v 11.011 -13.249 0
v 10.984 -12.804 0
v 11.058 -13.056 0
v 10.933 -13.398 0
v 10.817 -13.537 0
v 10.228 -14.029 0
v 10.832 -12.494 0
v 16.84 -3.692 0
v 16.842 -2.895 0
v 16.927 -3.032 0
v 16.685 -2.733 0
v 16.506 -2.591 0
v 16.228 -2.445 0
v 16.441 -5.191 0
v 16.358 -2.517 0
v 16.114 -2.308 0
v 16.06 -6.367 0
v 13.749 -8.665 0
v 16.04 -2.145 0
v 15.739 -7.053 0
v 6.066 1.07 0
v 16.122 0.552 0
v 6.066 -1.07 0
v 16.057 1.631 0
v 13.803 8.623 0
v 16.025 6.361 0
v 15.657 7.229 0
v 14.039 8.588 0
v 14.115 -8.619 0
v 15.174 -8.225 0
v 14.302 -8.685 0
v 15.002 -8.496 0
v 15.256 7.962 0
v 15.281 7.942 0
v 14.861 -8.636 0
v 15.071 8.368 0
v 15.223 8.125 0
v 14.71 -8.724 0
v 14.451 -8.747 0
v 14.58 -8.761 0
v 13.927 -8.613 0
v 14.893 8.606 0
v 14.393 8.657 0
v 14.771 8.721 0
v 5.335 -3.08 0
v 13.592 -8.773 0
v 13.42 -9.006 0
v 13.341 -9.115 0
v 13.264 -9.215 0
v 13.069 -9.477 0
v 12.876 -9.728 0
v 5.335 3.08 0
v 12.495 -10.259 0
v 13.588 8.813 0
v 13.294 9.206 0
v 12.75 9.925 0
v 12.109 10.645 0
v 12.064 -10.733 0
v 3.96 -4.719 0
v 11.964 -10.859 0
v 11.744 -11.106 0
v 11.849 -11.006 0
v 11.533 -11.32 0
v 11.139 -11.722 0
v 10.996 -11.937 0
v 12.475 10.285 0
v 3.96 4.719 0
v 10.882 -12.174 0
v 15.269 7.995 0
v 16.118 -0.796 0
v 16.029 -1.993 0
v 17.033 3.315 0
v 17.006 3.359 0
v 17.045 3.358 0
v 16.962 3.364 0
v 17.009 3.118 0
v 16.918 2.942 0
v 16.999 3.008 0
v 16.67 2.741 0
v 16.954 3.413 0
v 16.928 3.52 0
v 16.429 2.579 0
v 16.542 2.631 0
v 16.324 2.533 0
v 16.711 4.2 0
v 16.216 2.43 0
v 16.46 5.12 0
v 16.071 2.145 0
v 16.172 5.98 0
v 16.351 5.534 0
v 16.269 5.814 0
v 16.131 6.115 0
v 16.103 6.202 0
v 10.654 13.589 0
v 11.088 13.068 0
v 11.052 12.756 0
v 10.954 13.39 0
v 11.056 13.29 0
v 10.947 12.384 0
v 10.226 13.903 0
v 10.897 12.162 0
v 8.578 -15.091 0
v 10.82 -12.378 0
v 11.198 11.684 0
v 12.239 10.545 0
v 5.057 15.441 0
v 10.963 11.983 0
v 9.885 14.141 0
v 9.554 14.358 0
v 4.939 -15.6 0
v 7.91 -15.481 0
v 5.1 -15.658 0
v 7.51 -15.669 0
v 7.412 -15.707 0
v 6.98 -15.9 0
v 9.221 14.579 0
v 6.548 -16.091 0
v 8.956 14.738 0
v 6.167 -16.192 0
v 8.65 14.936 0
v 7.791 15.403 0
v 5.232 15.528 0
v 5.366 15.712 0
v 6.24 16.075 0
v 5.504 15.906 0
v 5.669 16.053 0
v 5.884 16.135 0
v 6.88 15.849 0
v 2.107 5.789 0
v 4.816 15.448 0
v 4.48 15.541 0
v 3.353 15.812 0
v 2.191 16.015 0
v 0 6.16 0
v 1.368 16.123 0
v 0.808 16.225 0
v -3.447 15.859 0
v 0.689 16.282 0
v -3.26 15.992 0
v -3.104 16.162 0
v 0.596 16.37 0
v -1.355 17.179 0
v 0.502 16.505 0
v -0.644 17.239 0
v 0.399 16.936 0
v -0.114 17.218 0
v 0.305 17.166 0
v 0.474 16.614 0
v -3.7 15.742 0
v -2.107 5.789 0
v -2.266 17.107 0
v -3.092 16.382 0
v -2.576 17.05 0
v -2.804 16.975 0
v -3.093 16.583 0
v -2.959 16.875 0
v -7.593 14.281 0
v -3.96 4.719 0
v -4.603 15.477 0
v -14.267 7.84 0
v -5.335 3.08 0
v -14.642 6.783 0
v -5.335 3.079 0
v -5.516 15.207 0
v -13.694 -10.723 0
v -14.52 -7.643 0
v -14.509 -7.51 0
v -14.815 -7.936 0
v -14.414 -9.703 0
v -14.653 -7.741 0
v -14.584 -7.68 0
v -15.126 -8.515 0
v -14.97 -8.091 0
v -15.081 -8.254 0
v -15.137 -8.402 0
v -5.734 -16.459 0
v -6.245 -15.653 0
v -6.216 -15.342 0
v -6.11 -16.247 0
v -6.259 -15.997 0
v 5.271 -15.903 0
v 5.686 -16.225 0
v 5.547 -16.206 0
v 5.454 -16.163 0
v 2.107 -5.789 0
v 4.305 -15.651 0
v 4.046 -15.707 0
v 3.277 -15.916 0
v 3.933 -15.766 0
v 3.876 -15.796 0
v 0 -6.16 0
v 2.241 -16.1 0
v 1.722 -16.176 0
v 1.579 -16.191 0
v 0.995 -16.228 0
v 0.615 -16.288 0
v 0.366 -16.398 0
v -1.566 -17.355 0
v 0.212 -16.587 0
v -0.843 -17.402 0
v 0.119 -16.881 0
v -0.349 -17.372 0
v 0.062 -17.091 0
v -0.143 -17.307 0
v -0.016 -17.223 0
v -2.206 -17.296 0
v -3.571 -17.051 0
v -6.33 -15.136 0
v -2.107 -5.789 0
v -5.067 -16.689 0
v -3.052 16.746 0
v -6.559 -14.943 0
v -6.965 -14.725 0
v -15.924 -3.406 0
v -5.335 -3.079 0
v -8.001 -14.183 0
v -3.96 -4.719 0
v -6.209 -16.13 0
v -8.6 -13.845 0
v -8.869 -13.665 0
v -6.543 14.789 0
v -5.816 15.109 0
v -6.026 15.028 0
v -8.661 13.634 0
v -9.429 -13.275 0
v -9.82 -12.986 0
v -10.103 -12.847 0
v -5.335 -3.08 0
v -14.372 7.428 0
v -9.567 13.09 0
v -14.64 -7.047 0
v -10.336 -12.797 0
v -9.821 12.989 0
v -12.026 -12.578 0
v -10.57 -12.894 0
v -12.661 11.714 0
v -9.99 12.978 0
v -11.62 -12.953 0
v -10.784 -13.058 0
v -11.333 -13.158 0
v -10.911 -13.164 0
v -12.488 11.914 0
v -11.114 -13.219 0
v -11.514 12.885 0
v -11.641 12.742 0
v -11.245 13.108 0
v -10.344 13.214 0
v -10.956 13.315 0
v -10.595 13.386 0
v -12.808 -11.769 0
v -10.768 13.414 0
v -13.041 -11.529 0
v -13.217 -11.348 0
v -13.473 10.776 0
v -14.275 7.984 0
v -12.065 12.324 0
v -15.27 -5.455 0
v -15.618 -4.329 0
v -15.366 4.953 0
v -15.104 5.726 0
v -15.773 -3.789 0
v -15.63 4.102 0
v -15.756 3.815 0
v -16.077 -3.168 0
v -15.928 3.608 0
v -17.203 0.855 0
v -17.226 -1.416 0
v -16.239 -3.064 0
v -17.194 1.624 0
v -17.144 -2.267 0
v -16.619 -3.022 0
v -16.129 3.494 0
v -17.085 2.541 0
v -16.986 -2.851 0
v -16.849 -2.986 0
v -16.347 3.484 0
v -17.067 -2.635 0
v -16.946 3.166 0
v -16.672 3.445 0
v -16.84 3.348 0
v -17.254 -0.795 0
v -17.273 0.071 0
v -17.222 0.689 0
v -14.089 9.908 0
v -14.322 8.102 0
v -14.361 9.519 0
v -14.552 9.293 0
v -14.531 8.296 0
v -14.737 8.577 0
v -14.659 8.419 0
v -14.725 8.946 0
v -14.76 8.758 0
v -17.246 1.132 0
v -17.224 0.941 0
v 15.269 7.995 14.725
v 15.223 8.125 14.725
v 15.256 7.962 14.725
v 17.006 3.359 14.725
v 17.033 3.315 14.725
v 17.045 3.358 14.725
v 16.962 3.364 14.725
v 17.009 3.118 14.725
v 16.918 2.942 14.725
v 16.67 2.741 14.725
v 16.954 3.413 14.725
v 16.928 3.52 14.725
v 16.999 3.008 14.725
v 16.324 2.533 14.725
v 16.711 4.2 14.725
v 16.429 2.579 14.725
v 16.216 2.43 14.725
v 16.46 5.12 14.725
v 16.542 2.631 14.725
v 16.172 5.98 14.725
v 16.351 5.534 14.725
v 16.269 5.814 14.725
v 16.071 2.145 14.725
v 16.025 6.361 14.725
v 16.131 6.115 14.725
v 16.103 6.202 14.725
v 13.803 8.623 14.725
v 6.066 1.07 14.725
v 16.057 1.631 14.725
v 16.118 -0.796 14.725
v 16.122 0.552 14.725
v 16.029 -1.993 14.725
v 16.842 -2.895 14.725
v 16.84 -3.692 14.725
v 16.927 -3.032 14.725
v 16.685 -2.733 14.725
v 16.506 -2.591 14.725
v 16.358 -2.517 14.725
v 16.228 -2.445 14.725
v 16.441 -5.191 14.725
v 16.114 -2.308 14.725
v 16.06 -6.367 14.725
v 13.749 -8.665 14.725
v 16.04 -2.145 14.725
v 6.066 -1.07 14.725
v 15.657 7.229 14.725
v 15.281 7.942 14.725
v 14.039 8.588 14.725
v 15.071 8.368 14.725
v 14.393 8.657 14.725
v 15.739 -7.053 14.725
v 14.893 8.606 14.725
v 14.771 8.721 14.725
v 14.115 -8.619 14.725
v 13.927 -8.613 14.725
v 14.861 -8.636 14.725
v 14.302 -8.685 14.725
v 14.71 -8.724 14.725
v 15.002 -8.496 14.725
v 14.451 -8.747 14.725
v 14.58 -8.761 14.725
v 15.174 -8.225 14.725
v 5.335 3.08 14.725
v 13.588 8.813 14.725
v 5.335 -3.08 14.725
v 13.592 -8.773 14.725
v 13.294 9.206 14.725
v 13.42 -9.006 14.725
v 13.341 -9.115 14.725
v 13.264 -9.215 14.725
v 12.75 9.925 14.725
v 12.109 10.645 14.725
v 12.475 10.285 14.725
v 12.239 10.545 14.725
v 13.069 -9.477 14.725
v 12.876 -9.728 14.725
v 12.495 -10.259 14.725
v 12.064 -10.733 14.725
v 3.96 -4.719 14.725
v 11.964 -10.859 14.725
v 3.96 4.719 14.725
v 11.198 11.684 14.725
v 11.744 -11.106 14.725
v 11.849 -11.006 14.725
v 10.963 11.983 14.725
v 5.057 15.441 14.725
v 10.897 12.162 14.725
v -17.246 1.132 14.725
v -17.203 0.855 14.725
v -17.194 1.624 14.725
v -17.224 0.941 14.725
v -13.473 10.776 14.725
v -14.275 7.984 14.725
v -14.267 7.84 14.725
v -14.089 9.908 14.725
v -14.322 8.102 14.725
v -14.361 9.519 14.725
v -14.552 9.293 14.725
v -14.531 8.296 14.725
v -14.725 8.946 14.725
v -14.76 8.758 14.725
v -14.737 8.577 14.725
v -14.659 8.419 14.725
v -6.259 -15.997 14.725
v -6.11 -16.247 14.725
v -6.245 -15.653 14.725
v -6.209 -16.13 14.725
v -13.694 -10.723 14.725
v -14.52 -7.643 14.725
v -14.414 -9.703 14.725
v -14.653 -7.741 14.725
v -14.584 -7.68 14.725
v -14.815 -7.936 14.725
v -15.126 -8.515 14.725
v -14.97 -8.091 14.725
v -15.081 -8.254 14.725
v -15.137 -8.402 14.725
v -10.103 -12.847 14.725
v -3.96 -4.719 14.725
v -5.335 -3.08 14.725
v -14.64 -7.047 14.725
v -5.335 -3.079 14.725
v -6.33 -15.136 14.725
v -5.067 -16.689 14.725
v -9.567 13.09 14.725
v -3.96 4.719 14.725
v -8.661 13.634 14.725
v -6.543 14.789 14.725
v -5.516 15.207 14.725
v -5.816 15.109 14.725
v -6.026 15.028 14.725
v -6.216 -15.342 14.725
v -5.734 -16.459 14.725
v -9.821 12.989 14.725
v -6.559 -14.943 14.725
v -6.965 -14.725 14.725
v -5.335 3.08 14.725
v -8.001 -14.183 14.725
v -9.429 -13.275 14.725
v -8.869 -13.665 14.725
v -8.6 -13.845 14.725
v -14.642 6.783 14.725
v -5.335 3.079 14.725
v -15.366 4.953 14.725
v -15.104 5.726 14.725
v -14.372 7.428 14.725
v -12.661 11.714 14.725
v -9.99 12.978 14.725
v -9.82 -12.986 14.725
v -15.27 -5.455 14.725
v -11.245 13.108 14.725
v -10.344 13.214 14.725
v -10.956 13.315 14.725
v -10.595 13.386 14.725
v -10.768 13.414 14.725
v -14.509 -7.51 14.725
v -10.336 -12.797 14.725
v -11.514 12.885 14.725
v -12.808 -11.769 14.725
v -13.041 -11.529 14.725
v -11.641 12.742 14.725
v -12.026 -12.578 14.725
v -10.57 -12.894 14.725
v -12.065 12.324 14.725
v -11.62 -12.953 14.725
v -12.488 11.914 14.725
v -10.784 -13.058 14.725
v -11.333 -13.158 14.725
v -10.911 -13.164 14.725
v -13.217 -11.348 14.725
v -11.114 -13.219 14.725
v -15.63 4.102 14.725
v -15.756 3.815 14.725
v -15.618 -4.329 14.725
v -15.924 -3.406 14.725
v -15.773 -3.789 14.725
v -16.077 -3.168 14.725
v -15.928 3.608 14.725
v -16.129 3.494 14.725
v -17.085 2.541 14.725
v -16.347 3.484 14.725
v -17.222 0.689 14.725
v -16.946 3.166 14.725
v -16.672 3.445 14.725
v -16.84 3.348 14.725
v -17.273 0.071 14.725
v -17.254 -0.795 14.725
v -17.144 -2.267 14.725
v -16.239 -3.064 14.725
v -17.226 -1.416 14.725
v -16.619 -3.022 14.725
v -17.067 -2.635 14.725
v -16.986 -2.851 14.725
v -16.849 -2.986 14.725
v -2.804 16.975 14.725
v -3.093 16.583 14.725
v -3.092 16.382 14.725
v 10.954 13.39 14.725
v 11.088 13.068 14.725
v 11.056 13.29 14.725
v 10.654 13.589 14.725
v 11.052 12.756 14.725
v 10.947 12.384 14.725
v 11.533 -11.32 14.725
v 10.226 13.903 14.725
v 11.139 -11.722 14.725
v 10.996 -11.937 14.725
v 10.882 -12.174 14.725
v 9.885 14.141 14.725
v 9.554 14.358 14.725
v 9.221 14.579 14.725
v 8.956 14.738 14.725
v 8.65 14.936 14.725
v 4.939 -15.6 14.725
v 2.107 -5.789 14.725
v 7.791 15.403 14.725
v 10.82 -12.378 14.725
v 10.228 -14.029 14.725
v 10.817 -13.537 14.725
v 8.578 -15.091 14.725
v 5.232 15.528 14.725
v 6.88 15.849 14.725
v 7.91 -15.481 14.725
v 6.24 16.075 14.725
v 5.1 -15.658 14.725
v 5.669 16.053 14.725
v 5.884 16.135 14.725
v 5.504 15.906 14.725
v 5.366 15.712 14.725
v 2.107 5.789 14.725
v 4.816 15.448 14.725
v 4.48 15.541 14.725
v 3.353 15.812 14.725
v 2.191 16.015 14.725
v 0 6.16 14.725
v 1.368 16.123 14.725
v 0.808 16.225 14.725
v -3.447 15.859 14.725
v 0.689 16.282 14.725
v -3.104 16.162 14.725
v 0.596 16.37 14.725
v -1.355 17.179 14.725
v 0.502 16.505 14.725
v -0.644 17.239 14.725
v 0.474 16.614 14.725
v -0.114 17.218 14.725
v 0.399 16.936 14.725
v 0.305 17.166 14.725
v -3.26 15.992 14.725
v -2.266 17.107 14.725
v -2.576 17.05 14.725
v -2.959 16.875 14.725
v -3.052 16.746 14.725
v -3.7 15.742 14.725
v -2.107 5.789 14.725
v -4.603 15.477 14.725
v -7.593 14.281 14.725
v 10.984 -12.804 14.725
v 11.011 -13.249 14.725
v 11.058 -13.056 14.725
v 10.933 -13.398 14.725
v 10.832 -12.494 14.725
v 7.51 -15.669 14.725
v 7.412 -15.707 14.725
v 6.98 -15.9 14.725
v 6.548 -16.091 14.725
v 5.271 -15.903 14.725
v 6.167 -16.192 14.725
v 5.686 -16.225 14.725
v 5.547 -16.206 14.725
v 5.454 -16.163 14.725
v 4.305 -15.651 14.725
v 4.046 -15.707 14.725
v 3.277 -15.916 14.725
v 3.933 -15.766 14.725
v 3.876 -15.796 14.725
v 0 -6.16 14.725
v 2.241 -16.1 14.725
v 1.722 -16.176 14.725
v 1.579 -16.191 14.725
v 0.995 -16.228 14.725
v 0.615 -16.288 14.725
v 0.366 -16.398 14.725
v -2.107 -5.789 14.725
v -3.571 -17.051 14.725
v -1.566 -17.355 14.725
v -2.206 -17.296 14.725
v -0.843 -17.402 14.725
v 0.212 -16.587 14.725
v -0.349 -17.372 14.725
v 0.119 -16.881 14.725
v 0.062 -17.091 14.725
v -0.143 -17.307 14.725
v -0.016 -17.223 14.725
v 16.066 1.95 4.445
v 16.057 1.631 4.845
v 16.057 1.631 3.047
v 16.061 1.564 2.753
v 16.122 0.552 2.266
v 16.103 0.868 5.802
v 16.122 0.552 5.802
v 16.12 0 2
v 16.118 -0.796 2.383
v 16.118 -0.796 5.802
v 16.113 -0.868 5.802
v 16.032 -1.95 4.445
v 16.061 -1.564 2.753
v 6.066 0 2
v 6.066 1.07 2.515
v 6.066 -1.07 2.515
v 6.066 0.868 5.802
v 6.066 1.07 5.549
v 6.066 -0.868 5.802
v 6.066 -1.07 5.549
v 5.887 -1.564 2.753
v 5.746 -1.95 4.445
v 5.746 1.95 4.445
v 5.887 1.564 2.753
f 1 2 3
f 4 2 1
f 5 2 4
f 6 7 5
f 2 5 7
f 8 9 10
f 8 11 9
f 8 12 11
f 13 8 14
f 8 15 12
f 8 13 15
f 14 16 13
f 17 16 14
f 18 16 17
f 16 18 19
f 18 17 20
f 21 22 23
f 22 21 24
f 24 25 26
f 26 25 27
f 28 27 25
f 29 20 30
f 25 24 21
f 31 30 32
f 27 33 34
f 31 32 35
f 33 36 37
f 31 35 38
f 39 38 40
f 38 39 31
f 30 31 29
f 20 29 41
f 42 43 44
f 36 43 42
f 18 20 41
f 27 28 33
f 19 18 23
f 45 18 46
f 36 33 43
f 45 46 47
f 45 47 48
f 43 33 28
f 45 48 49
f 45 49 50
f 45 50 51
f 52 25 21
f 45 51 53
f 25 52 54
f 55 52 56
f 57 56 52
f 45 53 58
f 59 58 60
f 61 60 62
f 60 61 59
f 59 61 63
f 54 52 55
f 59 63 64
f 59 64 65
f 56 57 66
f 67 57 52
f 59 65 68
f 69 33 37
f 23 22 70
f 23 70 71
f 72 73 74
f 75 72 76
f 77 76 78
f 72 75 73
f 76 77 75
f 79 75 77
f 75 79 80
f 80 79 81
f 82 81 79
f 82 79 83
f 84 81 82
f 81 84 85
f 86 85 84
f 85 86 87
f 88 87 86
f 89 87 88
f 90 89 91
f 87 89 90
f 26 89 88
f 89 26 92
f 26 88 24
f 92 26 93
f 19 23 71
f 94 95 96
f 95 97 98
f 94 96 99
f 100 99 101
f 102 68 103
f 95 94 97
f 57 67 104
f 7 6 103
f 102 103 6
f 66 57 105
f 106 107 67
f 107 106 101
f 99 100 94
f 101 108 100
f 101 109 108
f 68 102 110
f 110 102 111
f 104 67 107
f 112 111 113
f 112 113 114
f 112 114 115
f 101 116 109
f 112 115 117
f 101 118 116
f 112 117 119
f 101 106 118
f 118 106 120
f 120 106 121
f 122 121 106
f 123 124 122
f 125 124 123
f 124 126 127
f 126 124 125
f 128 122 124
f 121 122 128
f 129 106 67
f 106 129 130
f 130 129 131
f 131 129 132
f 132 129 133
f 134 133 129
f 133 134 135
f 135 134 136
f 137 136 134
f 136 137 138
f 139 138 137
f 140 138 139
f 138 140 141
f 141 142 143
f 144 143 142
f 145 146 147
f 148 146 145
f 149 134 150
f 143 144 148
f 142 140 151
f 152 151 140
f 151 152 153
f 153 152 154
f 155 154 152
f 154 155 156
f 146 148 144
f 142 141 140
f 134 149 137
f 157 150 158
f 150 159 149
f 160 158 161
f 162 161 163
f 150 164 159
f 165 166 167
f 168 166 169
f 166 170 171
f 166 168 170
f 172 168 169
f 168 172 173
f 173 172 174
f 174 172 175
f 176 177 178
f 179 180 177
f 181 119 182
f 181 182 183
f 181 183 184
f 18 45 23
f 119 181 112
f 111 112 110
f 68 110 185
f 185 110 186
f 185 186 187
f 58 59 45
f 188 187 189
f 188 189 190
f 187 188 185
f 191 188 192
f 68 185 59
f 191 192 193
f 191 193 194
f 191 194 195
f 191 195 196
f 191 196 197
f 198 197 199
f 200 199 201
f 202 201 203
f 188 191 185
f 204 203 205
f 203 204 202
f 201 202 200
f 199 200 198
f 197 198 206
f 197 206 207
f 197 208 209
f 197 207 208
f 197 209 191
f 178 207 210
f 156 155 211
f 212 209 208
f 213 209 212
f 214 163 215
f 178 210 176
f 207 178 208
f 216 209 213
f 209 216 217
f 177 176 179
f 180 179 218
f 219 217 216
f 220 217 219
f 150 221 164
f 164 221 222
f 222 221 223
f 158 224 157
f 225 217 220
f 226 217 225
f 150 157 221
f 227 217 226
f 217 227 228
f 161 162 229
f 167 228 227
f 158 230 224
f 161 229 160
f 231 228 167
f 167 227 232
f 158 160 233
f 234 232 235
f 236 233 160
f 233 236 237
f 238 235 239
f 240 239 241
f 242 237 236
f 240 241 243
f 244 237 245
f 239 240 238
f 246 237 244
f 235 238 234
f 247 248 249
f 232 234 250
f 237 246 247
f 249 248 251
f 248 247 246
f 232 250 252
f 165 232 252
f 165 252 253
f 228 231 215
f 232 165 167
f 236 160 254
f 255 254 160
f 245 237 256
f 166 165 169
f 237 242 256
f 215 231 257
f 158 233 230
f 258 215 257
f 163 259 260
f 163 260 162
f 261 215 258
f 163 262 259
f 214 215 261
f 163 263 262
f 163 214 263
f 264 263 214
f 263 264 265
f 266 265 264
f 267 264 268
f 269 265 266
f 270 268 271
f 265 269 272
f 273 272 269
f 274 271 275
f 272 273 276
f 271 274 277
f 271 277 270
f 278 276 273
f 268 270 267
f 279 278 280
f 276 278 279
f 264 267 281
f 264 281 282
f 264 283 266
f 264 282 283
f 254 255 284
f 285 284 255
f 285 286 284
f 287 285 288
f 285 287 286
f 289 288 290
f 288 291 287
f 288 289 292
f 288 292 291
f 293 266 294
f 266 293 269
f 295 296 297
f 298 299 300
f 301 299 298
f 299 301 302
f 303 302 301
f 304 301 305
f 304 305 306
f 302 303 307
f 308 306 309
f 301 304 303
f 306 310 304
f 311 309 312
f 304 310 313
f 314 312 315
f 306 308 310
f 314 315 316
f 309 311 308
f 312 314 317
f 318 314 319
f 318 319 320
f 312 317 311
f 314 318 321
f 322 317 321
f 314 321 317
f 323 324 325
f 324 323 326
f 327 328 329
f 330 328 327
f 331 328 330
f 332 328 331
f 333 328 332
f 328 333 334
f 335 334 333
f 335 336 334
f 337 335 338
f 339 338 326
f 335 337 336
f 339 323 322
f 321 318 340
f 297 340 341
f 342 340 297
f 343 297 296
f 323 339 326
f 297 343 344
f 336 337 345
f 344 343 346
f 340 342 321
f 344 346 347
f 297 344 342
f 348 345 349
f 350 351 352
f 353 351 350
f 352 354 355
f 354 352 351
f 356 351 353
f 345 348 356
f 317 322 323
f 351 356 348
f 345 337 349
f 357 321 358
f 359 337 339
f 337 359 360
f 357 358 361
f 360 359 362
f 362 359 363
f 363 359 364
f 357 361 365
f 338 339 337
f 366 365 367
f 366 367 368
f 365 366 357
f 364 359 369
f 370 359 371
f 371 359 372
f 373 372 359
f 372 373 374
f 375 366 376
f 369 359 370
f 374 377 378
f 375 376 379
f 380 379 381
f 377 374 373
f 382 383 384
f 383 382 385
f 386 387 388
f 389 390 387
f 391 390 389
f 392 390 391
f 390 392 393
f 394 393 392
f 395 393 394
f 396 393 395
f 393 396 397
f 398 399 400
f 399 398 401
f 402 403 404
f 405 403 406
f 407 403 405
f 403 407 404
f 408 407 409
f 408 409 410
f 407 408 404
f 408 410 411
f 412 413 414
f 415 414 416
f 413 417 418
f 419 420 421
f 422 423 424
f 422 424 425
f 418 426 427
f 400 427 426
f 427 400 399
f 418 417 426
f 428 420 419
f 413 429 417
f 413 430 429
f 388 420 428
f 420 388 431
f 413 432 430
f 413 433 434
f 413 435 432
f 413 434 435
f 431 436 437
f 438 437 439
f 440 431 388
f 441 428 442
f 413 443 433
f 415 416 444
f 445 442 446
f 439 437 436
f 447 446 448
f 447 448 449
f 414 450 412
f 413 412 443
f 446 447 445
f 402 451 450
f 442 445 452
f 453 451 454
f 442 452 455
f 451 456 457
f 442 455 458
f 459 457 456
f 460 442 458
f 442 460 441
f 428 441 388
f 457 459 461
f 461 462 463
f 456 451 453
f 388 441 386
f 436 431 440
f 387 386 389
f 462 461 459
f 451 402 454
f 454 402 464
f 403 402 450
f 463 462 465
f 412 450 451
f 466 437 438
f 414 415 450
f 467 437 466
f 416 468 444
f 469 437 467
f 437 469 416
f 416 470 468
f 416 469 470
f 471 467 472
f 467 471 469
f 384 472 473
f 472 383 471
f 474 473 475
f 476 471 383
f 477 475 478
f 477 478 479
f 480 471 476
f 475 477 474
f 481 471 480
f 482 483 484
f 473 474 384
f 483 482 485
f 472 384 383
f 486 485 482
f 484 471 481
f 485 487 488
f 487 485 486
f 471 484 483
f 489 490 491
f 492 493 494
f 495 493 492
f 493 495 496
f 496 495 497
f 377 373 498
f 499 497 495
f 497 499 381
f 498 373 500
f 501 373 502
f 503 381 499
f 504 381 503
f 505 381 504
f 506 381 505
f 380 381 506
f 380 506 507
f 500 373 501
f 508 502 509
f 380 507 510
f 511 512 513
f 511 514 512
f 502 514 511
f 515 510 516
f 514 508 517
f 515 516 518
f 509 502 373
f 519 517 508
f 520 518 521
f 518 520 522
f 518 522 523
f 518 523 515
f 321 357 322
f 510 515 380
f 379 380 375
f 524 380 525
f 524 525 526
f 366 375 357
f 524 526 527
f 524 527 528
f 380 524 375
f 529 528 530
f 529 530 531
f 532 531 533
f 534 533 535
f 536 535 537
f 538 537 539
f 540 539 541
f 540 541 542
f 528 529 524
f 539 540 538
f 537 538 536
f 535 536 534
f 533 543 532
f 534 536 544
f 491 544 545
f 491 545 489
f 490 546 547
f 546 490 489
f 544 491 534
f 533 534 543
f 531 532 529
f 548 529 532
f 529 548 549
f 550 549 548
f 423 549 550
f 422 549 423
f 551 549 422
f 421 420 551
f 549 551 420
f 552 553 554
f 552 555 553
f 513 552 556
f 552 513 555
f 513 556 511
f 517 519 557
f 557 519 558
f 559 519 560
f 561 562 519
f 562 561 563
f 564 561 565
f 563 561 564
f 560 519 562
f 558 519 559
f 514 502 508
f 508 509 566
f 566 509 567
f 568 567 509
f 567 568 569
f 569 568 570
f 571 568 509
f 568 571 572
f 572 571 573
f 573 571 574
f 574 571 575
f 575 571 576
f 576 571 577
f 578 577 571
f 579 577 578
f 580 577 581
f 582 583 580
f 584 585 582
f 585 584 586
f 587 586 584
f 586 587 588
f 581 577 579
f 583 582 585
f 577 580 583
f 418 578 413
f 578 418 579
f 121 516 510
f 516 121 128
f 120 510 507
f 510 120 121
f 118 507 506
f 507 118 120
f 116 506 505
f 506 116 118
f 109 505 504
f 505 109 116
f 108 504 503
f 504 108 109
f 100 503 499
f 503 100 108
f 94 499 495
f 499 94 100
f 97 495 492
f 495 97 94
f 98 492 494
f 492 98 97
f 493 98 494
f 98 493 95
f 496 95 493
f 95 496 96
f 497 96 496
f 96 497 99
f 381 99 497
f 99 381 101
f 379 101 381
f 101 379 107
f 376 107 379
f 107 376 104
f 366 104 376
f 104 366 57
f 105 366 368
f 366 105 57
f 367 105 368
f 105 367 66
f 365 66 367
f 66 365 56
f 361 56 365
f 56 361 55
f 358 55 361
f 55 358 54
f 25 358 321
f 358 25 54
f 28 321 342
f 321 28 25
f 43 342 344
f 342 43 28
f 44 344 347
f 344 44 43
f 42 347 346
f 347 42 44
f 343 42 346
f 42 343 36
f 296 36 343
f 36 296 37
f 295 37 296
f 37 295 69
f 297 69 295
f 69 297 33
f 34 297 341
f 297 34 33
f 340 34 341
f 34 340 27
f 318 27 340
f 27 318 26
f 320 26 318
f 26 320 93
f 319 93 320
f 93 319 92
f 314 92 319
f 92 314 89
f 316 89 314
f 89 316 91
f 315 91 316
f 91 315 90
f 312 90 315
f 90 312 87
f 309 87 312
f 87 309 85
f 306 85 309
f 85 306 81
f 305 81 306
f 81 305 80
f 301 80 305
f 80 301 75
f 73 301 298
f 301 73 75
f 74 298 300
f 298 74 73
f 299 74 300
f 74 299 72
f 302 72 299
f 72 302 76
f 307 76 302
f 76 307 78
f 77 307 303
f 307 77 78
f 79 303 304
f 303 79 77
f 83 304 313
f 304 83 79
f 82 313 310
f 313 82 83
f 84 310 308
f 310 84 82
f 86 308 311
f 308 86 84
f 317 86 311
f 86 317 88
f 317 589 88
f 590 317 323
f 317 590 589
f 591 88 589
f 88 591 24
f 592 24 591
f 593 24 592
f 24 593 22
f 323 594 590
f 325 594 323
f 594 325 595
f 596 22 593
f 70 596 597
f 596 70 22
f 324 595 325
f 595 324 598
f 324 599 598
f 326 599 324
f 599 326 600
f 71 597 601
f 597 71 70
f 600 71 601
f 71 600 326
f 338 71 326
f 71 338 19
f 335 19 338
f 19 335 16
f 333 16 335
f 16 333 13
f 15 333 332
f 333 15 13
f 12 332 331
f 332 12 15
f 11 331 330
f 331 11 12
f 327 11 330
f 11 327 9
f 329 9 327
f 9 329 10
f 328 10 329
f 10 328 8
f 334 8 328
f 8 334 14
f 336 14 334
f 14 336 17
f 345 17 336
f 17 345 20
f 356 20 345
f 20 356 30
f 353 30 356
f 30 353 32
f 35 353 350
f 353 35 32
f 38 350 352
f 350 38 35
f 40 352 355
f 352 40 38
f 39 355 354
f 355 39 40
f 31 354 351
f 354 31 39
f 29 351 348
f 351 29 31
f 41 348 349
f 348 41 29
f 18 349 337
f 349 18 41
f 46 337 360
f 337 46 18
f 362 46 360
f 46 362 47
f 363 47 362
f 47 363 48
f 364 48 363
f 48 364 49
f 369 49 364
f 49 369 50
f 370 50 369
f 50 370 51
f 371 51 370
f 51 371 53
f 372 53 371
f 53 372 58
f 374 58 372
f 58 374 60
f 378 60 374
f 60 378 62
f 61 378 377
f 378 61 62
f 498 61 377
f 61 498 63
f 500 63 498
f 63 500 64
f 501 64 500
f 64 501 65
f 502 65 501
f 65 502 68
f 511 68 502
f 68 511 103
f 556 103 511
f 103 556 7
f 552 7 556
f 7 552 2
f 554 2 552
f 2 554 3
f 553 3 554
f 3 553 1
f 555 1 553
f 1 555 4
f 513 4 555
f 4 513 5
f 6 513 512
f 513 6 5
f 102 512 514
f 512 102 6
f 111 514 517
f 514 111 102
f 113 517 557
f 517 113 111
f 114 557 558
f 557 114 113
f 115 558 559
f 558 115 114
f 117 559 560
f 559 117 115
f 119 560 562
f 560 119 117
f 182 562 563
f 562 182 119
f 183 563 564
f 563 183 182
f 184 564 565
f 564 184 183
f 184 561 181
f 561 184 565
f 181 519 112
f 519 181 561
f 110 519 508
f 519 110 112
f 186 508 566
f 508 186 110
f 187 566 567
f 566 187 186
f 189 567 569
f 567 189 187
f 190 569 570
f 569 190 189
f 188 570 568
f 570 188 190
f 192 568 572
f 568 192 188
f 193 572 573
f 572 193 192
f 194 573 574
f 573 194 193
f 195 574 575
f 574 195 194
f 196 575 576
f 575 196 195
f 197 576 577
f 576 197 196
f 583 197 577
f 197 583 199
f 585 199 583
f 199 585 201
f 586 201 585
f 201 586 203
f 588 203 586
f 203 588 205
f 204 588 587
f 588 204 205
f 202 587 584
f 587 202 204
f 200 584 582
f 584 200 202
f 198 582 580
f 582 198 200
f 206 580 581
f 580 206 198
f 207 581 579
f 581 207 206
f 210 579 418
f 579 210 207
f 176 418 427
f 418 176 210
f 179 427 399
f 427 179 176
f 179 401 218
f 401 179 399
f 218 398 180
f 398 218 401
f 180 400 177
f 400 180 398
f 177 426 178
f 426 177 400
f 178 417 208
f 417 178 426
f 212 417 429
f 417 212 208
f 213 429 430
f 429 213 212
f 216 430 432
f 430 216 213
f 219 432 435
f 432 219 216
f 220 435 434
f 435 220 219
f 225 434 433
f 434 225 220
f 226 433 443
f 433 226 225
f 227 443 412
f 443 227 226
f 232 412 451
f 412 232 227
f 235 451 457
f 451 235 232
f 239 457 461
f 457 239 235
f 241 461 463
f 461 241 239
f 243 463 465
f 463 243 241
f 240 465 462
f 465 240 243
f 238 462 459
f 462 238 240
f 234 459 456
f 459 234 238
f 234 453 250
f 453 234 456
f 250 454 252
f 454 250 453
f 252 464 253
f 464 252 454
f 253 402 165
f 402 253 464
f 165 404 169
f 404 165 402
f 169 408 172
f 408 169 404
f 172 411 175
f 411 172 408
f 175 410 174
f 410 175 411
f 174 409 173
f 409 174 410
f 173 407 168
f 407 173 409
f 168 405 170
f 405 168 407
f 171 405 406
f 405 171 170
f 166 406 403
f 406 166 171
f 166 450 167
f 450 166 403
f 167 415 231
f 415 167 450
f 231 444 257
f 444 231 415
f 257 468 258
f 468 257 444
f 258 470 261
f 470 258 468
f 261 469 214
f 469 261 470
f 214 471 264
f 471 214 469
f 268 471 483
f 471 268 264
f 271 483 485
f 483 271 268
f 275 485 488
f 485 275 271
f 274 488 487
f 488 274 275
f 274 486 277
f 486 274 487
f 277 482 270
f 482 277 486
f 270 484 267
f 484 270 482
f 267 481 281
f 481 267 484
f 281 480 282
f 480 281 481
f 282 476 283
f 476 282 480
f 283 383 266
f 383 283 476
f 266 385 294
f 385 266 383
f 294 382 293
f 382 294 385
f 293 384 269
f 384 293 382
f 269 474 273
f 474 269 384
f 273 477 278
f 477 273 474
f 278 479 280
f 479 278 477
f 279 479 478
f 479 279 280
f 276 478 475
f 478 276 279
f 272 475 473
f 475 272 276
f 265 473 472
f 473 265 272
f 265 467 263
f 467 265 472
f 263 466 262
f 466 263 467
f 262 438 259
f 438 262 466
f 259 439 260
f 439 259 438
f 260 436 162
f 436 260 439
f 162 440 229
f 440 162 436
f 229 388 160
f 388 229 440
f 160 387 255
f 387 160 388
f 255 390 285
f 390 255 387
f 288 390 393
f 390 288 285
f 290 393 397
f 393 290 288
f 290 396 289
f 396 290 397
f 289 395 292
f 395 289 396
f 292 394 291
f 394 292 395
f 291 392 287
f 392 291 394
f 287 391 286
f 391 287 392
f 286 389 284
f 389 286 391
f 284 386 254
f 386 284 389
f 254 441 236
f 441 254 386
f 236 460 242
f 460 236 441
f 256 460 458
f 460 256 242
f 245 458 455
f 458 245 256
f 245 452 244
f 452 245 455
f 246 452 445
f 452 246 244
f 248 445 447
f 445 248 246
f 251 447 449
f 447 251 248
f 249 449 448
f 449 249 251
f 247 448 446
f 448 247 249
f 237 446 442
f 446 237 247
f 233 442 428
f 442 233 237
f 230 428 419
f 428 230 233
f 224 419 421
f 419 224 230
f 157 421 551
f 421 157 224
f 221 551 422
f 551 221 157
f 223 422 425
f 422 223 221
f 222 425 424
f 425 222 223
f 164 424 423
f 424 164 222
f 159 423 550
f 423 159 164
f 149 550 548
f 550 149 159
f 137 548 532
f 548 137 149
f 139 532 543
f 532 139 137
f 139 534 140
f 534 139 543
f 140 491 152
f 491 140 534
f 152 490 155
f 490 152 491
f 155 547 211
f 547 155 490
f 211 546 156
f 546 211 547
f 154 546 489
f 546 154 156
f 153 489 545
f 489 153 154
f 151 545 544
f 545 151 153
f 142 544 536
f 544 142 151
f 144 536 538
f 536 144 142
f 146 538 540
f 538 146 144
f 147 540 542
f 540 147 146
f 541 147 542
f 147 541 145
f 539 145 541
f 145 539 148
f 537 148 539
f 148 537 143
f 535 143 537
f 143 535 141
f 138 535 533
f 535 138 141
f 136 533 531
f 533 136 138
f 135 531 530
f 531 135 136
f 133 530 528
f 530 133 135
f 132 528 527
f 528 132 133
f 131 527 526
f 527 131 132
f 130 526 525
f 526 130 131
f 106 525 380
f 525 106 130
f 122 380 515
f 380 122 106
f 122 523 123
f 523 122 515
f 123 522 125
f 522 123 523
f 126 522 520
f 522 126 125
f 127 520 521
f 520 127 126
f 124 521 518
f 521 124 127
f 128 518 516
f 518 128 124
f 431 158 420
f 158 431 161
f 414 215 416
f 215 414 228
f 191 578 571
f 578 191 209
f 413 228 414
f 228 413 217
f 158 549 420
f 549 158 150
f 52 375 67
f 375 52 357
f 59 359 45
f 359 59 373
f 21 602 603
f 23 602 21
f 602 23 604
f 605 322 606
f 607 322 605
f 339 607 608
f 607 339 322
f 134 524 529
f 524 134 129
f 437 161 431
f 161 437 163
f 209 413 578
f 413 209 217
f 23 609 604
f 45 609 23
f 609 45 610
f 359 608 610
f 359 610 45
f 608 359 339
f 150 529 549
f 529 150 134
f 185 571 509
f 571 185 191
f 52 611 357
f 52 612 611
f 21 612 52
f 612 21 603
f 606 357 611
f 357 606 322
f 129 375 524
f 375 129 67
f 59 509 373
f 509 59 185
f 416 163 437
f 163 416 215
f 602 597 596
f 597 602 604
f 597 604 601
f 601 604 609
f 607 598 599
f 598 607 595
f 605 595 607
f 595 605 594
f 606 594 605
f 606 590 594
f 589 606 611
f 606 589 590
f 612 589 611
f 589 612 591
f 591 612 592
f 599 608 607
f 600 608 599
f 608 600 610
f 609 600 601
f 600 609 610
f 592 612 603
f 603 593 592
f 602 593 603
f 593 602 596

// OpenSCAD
// Module names are of the form poly_<inkscape-path-id>().  As a result,
// you can associate a polygon in this OpenSCAD program with the corresponding
// SVG element in the Inkscape document by looking for the XML element with
// the attribute id="inkscape-path-id".

// fudge value is used to ensure that subtracted solids are a tad taller
// in the z dimension than the polygon being subtracted from.  This helps
// keep the resulting .stl file manifold.
fudge = 0.1;

module poly_path3386(h)
{
  scale([25.4/90, -25.4/90, 1]) union()
  {
    difference()
    {
       linear_extrude(height=h)
         polygon([[-33.987888,392.697738],[-49.999310,390.711858],[-59.408529,387.759464],[-62.169828,385.621300],[-63.919597,382.882078],[-65.236568,375.121218],[-66.075386,368.025598],[-69.612998,363.966368],[-75.641290,360.729031],[-85.746118,357.799868],[-111.487888,350.589118],[-126.487888,345.885178],[-133.362888,343.136938],[-147.737888,337.085178],[-157.863998,332.485828],[-164.846488,330.701288],[-170.294780,330.708022],[-175.074868,333.991018],[-179.072268,338.673768],[-181.414938,341.632408],[-185.685749,343.830842],[-190.868628,343.507162],[-198.252756,340.299062],[-209.127318,333.844238],[-230.448268,319.469238],[-236.816338,315.216468],[-241.605968,311.992958],[-255.237888,300.282038],[-276.197684,280.902674],[-297.748008,257.716468],[-298.530303,255.253976],[-297.985943,251.665674],[-296.274140,247.498817],[-293.554108,243.300658],[-290.862888,238.172888],[-289.612888,236.466468],[-288.346295,235.346986],[-288.737353,232.323879],[-293.874928,222.578828],[-315.508307,189.979131],[-328.660668,166.464348],[-334.679480,155.121539],[-339.878817,147.272869],[-344.441620,142.685292],[-348.550827,141.125758],[-357.238139,141.989078],[-362.568678,142.272016],[-366.253002,139.918628],[-369.103974,135.468962],[-372.568990,127.608501],[-378.458152,108.966468],[-382.039590,95.216468],[-386.570862,75.937019],[-388.362674,61.883128],[-388.726847,58.082357],[-389.602112,56.258128],[-391.015580,52.091468],[-392.189853,40.841468],[-394.100952,19.812536],[-393.980025,5.169928],[-392.459216,0.609433],[-389.174474,-2.373812],[-382.078520,-4.778852],[-377.267507,-6.033233],[-373.305582,-9.551489],[-370.455026,-14.988789],[-368.978122,-22.000302],[-367.142514,-42.283532],[-364.946418,-60.813713],[-359.644638,-86.658532],[-356.658329,-102.349650],[-356.277549,-112.058453],[-357.144447,-115.253946],[-358.758987,-117.655211],[-364.359335,-121.010192],[-367.800635,-123.147476],[-370.286114,-126.319423],[-371.661458,-130.242452],[-371.772355,-134.632982],[-369.555734,-143.205617],[-366.366540,-149.158532],[-362.128939,-159.158532],[-352.481307,-181.485303],[-338.773760,-206.321192],[-335.862888,-211.619542],[-328.362888,-222.808232],[-320.862888,-234.171412],[-318.701653,-237.972675],[-313.739350,-244.218646],[-308.258081,-250.230726],[-304.539948,-253.330322],[-300.524921,-253.523447],[-294.107398,-250.884992],[-285.055768,-247.283532],[-281.342092,-248.322538],[-276.132718,-251.803957],[-258.457168,-268.280432],[-237.668561,-287.813311],[-216.589368,-304.158532],[-206.175438,-311.969502],[-201.863048,-314.782006],[-195.613048,-318.384906],[-176.487888,-328.778513],[-157.554116,-338.984662],[-152.454413,-342.806714],[-148.903618,-346.657918],[-146.227438,-351.212924],[-147.007528,-356.174767],[-147.980833,-360.671210],[-147.839054,-364.505963],[-146.374777,-367.833411],[-143.380588,-370.807942],[-138.649072,-373.583940],[-131.972817,-376.315793],[-111.956428,-382.264607],[-96.331428,-386.989347],[-84.376198,-389.037092],[-74.764528,-389.874043],[-71.563698,-385.163620],[-68.362888,-378.328482],[-67.222176,-376.015643],[-64.479608,-373.438631],[-61.985849,-371.922180],[-59.053443,-371.206801],[-46.042108,-371.596801],[-27.112888,-373.080517],[-0.174899,-374.079236],[26.316772,-373.378646],[34.262300,-372.876069],[39.695595,-373.884667],[43.189146,-376.646225],[45.315442,-381.402528],[47.481279,-386.406379],[50.460362,-390.478716],[54.883834,-393.323097],[63.140352,-393.666307],[78.512112,-391.668918],[101.012112,-386.023358],[122.438302,-379.673143],[130.204252,-376.693748],[136.903062,-374.385826],[145.387112,-371.033532],[153.824612,-367.761976],[162.574612,-364.062149],[173.637002,-359.062149],[181.305742,-356.033532],[184.043617,-354.282157],[185.819957,-349.486589],[186.493708,-342.334663],[185.923812,-333.514213],[185.856340,-328.301367],[188.189602,-324.624654],[194.854652,-319.062196],[220.163902,-300.145732],[223.550902,-298.533532],[230.072402,-293.846032],[237.935402,-287.099502],[253.512112,-273.610492],[261.945906,-266.212899],[267.661434,-262.993267],[273.095571,-263.319133],[280.685192,-266.558032],[288.844482,-269.783532],[292.121154,-267.792961],[297.220829,-263.319239],[301.780198,-258.609354],[303.435952,-255.910292],[303.295944,-255.114517],[303.937232,-254.783532],[315.745882,-240.621644],[328.084902,-222.973622],[330.587762,-219.783532],[331.637112,-217.970642],[333.199612,-215.158142],[336.146670,-211.890367],[339.305722,-206.033532],[343.711952,-197.283532],[353.700972,-177.908532],[361.785692,-163.741872],[362.887112,-161.480592],[363.290995,-160.413157],[364.299272,-160.508762],[365.163542,-160.673747],[365.103752,-159.645032],[365.520872,-155.134892],[365.820871,-152.622646],[364.319842,-150.759892],[359.720102,-145.094432],[357.384580,-142.015011],[355.102952,-140.318342],[352.964857,-138.790648],[351.048642,-135.973866],[349.151872,-128.908112],[351.299975,-117.356137],[357.863222,-93.533532],[364.197575,-63.379653],[367.887112,-36.197342],[368.854739,-32.841599],[371.287934,-29.544194],[374.482170,-27.032411],[377.732922,-26.033532],[381.391420,-25.082045],[386.064132,-22.762623],[390.366923,-19.877823],[392.915652,-17.230202],[394.100952,-2.053212],[392.307452,33.356571],[389.362822,61.466468],[385.449962,78.341468],[378.388502,107.226396],[375.838083,114.104678],[373.343672,117.892278],[370.376340,120.591025],[367.645231,122.023864],[364.698150,122.329223],[361.082902,121.645528],[356.582250,121.076053],[352.351451,121.830888],[348.623518,123.829426],[345.631462,126.991058],[342.887112,133.032538],[341.637112,135.841468],[340.387112,138.440078],[337.262112,145.216468],[334.137112,151.744528],[328.143839,165.435862],[320.781192,178.091078],[319.137112,181.375528],[317.262112,185.216468],[315.387112,187.942818],[311.684162,193.727268],[304.789602,204.591468],[302.602607,210.094453],[301.189431,215.933839],[300.776791,220.782478],[301.591402,223.313218],[306.461342,229.524908],[309.310295,234.804256],[309.192742,239.344808],[308.145957,243.047161],[306.214850,246.708069],[295.387112,260.520288],[263.520422,292.091468],[250.458152,303.987729],[242.398202,310.091388],[240.387112,311.407318],[231.637112,317.782388],[222.887112,324.118938],[214.865227,328.168506],[204.255962,331.207718],[201.056942,331.432934],[198.779370,330.922332],[193.453362,325.984268],[188.468610,321.307977],[184.584512,320.779658],[170.650860,324.930919],[165.120474,327.416670],[162.887112,329.261348],[161.738622,330.216468],[148.926122,335.732308],[126.637112,344.774008],[115.387112,348.945668],[112.262112,349.962968],[99.385522,353.567898],[91.160241,356.705014],[86.116402,360.368411],[83.582521,365.321631],[82.887112,372.328218],[82.624029,377.293749],[81.508472,380.619268],[79.050986,383.100175],[74.762112,385.531868],[63.867735,388.561793],[47.461562,390.937928],[32.887112,392.663488],[1.199152,393.666307],[-33.987888,392.697788]]);
       translate([0, 0, -fudge])
         linear_extrude(height=h+2*fudge)
           polygon([[26.252372,105.125118],[34.690422,103.966468],[39.035151,103.455062],[41.637112,102.091468],[44.882602,100.216468],[56.487952,95.216468],[67.166562,90.216468],[73.318872,84.591468],[77.739067,80.618812],[80.797832,78.966468],[82.273385,78.428606],[82.887112,77.135448],[83.571600,75.475957],[85.217272,74.057358],[93.281489,66.966307],[99.137112,60.010518],[101.620332,58.966468],[103.913926,57.923144],[105.848382,54.903968],[110.552662,47.740608],[113.199612,43.678108],[115.387112,40.216468],[117.887112,35.816628],[121.028092,26.186788],[123.590945,17.601082],[124.895312,7.152608],[126.260462,-5.185372],[127.153307,-13.654833],[125.809472,-23.373682],[124.137112,-31.860982],[121.814202,-40.770832],[117.276502,-52.569262],[115.392917,-57.429122],[113.974422,-59.057982],[113.160612,-59.155836],[112.730862,-60.334762],[110.315122,-68.138792],[108.515207,-71.113213],[106.524462,-72.675182],[104.366632,-74.489284],[102.165002,-78.069922],[95.235152,-87.908532],[84.957959,-99.184096],[81.637112,-103.757322],[75.765345,-107.349189],[64.449612,-112.390792],[61.637112,-114.826372],[61.261959,-115.551272],[60.359982,-115.391772],[57.649685,-115.947016],[52.926822,-118.390332],[43.651959,-122.414063],[31.373902,-125.422209],[17.831128,-127.099320],[4.762112,-127.129942],[-20.711670,-123.990051],[-29.596237,-121.629860],[-36.698118,-118.580862],[-44.833098,-116.033532],[-48.999588,-114.764592],[-53.955438,-111.752642],[-58.197253,-109.215908],[-62.755159,-105.336239],[-66.757669,-100.954667],[-69.333298,-96.912222],[-70.862888,-89.974722],[-72.136328,-85.260092],[-75.854488,-75.947592],[-81.456048,-58.682412],[-84.612888,-45.494912],[-86.145818,-40.000612],[-87.951618,-33.188112],[-89.106696,-24.313042],[-91.043118,-19.713512],[-92.379448,-15.651012],[-93.596288,-12.283532],[-93.797048,-10.361972],[-93.829575,-8.375973],[-94.943168,-6.299472],[-97.455118,0.216468],[-98.952438,7.716468],[-101.878959,20.100288],[-102.687098,30.113118],[-102.334379,36.258386],[-101.175388,38.654778],[-99.612888,40.751908],[-97.112888,44.591468],[-94.612888,48.535208],[-94.022825,49.722593],[-92.604148,50.216468],[-91.288903,50.726058],[-91.384288,52.272238],[-91.301995,54.309300],[-90.144711,56.507019],[-88.497601,58.078843],[-86.945828,58.238218],[-86.179178,58.429774],[-85.856678,59.830188],[-82.641258,65.841468],[-80.662133,67.941041],[-80.410348,67.722978],[-78.453734,69.050904],[-72.375758,74.867378],[-63.362888,84.872678],[-60.732088,87.508068],[-58.943494,88.406549],[-59.031078,87.646578],[-59.265019,86.685833],[-58.224388,86.720968],[-56.331638,88.758128],[-56.019138,91.558118],[-55.266183,92.370482],[-53.675388,92.439588],[-51.507370,92.807327],[-49.366728,94.337708],[-47.543320,95.802187],[-46.138038,96.011518],[-40.554598,98.368488],[-35.916154,100.702139],[-31.049478,102.041838],[-20.868158,104.735208],[-15.120311,106.168498],[-7.976978,106.130408],[2.887112,106.531908],[14.224757,106.932697],[26.252372,105.125118]]);
    }
  }
}

height = 95;

module pignon(h, s=.155)
{
scale([s,s,s])
poly_path3386(h);
}
ext_radius = 34.6/2;

module dents(){
rotate([0,0,-12])
translate([0,-.2,0]){
    color("White", .5)
    {
        cylindre(6,6.2);
        pignon(height);
    }
}
}


module cylindre(r, h=1){
linear_extrude(height=h)
    circle(r);
}

module carreau(r, h=1){
linear_extrude(height=h)
    square(r,center=true);
}

module axe(sca=1.10, h=16)
{
    scale([sca, sca, sca])
    rotate([0,0,-90])
    difference(){
        cylindre(5.6,h);
        translate([0,-9.7,0]){
        carreau(9.7,h);
        }
        
    }
}

difference()
{
    difference(){
        dents();
        axe();
    };
    translate([0,0,4])
    rotate([0,90,0])
    cylindre(r=2,h=35);
}
//cercle(ext_radius);
